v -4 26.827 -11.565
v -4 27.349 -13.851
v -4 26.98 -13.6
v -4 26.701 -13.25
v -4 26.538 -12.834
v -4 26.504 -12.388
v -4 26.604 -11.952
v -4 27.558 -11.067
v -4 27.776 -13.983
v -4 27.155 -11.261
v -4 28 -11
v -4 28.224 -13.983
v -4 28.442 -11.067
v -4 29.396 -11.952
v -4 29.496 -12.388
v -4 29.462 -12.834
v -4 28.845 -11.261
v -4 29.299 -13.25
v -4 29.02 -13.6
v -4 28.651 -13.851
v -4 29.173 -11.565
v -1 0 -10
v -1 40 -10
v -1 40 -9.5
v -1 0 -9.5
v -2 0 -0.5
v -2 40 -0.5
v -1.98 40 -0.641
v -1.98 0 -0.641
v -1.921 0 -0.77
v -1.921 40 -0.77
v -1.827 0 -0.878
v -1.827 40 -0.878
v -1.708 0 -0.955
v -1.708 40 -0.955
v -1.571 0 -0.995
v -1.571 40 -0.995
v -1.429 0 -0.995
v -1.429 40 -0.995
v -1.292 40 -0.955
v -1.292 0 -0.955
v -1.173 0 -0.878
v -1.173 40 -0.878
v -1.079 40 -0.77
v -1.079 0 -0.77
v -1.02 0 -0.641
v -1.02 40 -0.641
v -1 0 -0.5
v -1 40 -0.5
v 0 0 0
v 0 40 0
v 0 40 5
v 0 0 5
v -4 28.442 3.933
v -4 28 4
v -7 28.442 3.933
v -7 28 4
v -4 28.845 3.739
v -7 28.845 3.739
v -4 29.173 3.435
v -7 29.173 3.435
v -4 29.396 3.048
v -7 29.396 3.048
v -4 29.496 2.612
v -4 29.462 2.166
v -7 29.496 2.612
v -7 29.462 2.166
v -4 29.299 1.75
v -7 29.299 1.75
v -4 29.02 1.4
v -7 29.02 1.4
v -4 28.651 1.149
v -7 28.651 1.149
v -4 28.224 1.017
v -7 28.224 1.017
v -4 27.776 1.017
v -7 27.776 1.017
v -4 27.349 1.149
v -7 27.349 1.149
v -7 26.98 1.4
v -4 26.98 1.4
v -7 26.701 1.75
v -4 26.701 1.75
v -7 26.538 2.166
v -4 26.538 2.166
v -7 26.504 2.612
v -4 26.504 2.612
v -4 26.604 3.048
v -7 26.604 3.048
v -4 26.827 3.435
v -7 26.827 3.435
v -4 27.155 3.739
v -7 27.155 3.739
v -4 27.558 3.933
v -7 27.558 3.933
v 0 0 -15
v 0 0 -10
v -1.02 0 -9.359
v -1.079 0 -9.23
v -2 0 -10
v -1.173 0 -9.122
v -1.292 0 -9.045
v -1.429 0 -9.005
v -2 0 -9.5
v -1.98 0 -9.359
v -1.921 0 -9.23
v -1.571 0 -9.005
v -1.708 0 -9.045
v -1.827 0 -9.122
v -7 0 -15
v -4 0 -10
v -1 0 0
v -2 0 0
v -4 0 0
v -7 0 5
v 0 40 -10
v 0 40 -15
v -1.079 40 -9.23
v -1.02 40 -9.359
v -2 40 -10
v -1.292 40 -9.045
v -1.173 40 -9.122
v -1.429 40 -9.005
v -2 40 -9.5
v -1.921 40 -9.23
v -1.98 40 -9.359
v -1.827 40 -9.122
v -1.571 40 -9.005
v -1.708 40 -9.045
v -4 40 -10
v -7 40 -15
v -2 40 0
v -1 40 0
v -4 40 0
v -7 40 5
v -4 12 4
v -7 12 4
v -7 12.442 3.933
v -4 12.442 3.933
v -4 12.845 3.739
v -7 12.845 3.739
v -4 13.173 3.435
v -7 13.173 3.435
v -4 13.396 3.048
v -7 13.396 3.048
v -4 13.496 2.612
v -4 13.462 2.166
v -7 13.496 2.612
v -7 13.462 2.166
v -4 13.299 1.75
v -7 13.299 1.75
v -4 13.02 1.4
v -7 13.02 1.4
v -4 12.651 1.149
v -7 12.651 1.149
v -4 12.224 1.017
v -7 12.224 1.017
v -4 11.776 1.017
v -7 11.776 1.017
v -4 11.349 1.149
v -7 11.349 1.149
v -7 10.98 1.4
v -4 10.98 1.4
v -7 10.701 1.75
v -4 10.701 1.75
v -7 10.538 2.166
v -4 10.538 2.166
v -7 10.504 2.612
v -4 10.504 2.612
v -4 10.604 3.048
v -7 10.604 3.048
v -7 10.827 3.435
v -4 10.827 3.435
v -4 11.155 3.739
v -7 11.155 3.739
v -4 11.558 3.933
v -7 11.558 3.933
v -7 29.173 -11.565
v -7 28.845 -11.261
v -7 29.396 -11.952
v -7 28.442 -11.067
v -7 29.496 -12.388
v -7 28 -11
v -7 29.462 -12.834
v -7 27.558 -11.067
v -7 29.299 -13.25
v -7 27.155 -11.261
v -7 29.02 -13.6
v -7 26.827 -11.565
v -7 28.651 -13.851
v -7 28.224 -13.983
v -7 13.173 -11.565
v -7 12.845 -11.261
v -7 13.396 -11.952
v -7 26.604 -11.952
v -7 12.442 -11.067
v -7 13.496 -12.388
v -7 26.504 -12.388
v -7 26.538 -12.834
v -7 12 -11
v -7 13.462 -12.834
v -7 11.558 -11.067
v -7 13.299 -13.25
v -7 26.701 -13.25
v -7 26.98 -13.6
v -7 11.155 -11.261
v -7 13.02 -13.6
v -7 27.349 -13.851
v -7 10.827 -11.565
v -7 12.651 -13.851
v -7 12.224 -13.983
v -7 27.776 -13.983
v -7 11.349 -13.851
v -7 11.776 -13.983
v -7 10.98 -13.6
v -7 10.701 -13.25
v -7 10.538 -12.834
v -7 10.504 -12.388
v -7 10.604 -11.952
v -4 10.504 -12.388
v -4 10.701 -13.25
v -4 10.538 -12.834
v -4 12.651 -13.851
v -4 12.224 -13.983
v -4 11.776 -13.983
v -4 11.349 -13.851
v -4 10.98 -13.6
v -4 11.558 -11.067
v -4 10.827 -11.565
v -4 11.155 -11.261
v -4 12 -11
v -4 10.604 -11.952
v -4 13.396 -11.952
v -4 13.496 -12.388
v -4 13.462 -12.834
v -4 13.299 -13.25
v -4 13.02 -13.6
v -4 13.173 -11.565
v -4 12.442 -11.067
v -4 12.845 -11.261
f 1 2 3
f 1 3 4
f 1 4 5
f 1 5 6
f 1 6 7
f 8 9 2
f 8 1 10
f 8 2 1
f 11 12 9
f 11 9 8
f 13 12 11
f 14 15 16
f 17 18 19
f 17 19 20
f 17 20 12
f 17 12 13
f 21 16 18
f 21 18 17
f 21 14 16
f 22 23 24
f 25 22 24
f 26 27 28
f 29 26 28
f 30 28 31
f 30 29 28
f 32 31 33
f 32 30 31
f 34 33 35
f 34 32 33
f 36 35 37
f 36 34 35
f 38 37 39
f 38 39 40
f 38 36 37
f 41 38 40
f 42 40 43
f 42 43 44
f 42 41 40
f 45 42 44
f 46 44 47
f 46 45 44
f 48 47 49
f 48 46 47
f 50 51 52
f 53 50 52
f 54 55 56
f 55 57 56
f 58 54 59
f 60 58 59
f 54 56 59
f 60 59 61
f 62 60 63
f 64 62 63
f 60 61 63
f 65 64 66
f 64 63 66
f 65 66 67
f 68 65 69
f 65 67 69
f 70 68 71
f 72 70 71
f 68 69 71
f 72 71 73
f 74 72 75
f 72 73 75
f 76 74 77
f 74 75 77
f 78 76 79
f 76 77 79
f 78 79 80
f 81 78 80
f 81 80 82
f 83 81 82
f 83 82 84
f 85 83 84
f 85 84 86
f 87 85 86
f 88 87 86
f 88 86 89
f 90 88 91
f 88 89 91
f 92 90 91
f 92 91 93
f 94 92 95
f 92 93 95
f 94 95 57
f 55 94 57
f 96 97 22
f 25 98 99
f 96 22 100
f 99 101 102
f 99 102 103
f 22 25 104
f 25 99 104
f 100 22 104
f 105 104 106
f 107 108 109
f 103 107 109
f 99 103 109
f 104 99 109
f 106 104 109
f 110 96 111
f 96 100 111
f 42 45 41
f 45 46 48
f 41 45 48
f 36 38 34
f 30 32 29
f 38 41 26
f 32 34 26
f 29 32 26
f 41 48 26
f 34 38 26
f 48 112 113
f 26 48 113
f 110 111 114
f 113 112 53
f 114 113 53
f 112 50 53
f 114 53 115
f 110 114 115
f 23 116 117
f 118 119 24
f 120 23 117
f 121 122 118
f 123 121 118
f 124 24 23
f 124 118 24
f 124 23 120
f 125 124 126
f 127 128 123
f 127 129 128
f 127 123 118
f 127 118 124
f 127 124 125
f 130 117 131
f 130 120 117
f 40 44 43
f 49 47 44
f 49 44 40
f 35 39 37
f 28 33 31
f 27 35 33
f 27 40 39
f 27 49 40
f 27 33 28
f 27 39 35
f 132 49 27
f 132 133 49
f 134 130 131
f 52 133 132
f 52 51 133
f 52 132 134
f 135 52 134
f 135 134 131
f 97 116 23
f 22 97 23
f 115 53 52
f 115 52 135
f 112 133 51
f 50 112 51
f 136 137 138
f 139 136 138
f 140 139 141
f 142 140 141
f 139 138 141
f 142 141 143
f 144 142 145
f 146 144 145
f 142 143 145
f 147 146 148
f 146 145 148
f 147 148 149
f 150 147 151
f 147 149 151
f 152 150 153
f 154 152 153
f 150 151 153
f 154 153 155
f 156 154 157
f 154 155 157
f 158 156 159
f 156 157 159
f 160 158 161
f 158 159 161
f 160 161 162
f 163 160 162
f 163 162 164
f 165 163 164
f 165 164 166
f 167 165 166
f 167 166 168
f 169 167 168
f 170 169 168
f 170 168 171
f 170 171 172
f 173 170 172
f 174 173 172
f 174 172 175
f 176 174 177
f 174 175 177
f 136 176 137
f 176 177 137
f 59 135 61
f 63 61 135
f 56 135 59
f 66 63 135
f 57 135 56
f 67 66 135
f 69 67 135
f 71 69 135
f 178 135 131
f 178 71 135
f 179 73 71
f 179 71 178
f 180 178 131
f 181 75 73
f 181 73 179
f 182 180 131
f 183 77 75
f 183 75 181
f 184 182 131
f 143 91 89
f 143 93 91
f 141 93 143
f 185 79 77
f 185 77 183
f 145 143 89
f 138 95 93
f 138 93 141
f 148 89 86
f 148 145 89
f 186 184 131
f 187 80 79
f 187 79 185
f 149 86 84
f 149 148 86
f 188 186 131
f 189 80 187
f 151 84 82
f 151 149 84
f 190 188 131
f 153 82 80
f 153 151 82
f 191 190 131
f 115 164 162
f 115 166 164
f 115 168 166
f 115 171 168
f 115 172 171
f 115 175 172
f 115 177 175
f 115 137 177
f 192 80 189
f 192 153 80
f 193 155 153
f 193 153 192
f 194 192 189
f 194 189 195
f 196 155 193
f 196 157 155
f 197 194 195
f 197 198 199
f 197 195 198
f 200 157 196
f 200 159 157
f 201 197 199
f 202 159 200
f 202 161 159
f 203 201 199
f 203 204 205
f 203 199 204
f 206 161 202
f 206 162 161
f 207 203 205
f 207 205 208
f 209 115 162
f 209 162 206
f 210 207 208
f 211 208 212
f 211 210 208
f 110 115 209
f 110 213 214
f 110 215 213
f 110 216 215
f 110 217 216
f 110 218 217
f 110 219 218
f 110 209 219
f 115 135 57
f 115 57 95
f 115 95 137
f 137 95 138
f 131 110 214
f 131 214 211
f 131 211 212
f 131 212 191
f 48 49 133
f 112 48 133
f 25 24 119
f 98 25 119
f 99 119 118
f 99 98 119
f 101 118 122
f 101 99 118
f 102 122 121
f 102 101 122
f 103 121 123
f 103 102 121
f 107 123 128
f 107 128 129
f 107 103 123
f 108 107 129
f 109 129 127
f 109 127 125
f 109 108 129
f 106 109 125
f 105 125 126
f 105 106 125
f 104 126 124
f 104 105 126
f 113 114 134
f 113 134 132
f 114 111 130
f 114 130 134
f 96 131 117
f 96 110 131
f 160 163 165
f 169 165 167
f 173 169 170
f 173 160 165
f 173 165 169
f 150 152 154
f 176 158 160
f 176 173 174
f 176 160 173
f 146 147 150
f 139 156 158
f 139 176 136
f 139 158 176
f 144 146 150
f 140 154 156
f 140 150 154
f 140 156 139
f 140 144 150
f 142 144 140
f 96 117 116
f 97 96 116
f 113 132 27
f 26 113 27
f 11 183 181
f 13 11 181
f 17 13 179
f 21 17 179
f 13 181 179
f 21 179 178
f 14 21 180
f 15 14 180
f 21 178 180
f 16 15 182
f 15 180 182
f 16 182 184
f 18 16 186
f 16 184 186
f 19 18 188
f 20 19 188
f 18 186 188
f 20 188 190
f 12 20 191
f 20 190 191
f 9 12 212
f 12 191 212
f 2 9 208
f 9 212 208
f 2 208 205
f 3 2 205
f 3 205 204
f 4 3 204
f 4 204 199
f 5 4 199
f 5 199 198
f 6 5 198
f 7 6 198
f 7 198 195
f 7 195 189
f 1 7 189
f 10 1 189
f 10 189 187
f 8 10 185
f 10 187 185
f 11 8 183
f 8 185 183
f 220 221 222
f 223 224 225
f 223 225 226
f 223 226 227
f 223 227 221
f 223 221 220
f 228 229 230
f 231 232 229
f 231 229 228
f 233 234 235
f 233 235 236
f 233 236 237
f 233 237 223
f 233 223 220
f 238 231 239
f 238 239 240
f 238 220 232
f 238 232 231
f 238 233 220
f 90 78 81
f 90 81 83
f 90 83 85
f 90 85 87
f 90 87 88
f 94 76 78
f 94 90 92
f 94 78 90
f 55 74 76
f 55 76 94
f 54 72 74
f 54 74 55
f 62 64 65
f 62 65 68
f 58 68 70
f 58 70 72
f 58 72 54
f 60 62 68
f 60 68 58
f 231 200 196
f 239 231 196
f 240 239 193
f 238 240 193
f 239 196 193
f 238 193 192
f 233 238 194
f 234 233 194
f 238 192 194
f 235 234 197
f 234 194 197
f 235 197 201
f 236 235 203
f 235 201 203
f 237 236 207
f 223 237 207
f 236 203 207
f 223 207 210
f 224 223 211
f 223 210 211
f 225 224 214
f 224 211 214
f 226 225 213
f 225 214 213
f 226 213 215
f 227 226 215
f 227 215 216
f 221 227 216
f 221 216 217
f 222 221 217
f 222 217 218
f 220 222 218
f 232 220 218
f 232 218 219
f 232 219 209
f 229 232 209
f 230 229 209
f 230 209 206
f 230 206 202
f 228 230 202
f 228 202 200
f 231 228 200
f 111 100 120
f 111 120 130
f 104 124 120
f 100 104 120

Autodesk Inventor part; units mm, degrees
ref_plane "YZ Plane" through (0, 0, 0) normal (1, 0, 0) x (0, 1, 0)
ref_plane "XZ Plane" through (0, 0, 0) normal (0, 1, 0) x (-1, 0, 0)
ref_plane "XY Plane" through (0, 0, 0) normal (0, 0, 1) x (1, 0, 0)
sketch "Sketch1" plane through (0, 0, 0) normal (0, 1, 0) x (-1, 0, 0)
  line L0 (0, 0) -> (0, 5)
  line L1 (0, 5) -> (7, 5)
  line L2 (7, 5) -> (7, -15)
  line L3 (7, -15) -> (0, -15)
  line L4 (0, -15) -> (0, -10)
  line L5 (0, -10) -> (4, -10)
  line L6 (4, -10) -> (4, 0)
  line L7 (4, 0) -> (0, 0)
  dimension "d0" = 5
  dimension "d1" = 7
  dimension "d2" = 20
  dimension "d3" = 7
  dimension "d4" = 5
  dimension "d5" = 4
  dimension "d6" = 10
extrude "Extrusion1" add sketch "Sketch1" along normal blind 40
sketch "Sketch2" plane through (-7, 0, -15) normal (-1, 0, 0) x (0, 0, 1)
  line L0 (5, 0) -> (5, 40) projected
  line L1 (15, 0) -> (15, 40) projected
  point P0 (15, 20)
  point P1 (10, 10)
  point P2 (10, 30)
  dimension "d9" = 5
  dimension "d10" = 10
  dimension "d11" = 20
  dimension "d12" = 10
sketch "Sketch5" plane through (0, 0, 0) normal (0, -1, 0) x (1, 0, 0)
  line L0 (-1, -10) -> (-1, -9.5)
  line L1 (-1.5, -9) -> (-1.5, -9)
  line L2 (-2, -9.5) -> (-2, -10)
  line L3 (-2, -10) -> (-1, -10)
  line L4 (-1, -0.5) -> (-1, 0)
  line L5 (-1, 0) -> (-2, 0)
  line L6 (-2, 0) -> (-2, -0.5)
  line L7 (-1.5, -1) -> (-1.5, -1)
  arc A0 (-1.5, -9) -> (-2, -9.5) centre (-1.5, -9.5) ccw
  arc A1 (-1, -9.5) -> (-1.5, -9) centre (-1.5, -9.5) ccw
  arc A2 (-2, -0.5) -> (-1.5, -1) centre (-1.5, -0.5) ccw
  arc A3 (-1.5, -1) -> (-1, -0.5) centre (-1.5, -0.5) ccw
  point P0 (0, 0)
  point P1 (-1, -9)
  point P2 (-2, -9)
  point P3 (-1, -1)
  point P4 (-2, -1)
  point P5 (-1.5, 0)
  point P6 (-1.5, -10)
  point P7 (0, -10)
  dimension "d35" = 1
  dimension "d36" = 1
  dimension "d37" = 1
  dimension "d38" = 1
  dimension "d39" = 1
  dimension "d40" = 1
  dimension "d41" = 0.5
  dimension "d42" = 1
  dimension "d43" = 1
extrude "Extrusion2" add sketch "Sketch5" against normal blind 40
sketch "Sketch10" plane through (-7, 0, -15) normal (-1, 0, 0) x (0, 0, 1)
  circle A0 centre (2.5, 12) radius 1.5
  circle A1 centre (2.5, 28) radius 1.5
  circle A2 centre (17.5, 12) radius 1.5
  circle A3 centre (17.5, 28) radius 1.5
  line L0 (20, 0) -> (0, 0) projected
  line L1 (0, 0) -> (0, 40) projected
  point P0 (15, 0)
  dimension "d72" = 3
  dimension "d73" = 3
  dimension "d74" = 3
  dimension "d75" = 3
  dimension "d76" = 16
  dimension "d77" = 15
  dimension "d78" = 15
  dimension "d79" = 16
  dimension "d81" = 2.5
  dimension "d82" = 12
extrude "Extrusion6" cut sketch "Sketch10" against normal blind 3
sketch "Sketch4" plane through (-4, 0, 0) normal (1, 0, 0) x (0, 0, -1)
  point P0 (5, 30)
  point P1 (5, 10)
properties part number "Karetka"
